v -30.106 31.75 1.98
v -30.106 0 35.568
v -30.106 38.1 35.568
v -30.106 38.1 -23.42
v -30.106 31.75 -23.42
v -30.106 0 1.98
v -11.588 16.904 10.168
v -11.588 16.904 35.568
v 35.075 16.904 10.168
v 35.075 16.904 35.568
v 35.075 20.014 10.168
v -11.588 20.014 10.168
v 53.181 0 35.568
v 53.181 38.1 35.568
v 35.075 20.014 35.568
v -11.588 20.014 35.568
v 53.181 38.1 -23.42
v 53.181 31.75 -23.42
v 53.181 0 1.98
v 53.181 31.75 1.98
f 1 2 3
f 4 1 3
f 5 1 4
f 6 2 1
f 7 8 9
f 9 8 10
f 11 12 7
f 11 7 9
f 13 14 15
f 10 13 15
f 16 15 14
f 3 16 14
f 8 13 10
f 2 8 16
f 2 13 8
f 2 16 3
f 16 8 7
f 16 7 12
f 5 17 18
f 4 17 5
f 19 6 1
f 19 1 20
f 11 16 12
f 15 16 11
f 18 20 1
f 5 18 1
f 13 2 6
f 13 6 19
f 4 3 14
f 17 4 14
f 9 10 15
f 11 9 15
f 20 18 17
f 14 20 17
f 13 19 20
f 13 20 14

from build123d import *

# Parameters (mm, degrees)
F1_DEPTH = 38.1
F2_W     = 83.2868572325
F2_H     = 33.5878157057
F2_H_2   = 25.4
F3_DEPTH = 6.35
F4_W     = 46.6631539166
F4_H     = 3.1104013324
F5_DEPTH = 25.4


# Not quite as in the source:
# - a feature names something its author has since deleted; it is built from what else it names


with BuildPart() as f1:
    # F0 (on Front) → F1 (new body)
    with BuildSketch(Plane.XZ):
        Polygon((53.1807057559, 35.5675853789), (-30.1061514765, 35.5675853789), (-30.1061514765, 1.9797696732), (-19.1832855344, 1.9797696732), (-9.4892410561, 1.9797696732), (53.1807057559, 1.9797696732), align=None)
    extrude(amount=-F1_DEPTH)

    # F2 (on face) → F3 (join)
    with BuildSketch(Plane(origin=(0, 38.1, 0), x_dir=(-1, 0, 0), z_dir=(0, 1, 0))):
        with Locations((-11.5372771397, 18.773677526)):
            Rectangle(F2_W, F2_H)
        with Locations((-11.5372771397, -10.7202303268)):
            Rectangle(F2_W, F2_H_2)
    extrude(amount=-F3_DEPTH)

    # F4 (on face) → F5 (cut)
    with BuildSketch(Plane.XY.offset(35.5675853789)):
        with Locations((11.7438416928, 18.4589158744)):
            Rectangle(F4_W, F4_H)
    extrude(amount=-F5_DEPTH, mode=Mode.SUBTRACT)


solid = f1.part
